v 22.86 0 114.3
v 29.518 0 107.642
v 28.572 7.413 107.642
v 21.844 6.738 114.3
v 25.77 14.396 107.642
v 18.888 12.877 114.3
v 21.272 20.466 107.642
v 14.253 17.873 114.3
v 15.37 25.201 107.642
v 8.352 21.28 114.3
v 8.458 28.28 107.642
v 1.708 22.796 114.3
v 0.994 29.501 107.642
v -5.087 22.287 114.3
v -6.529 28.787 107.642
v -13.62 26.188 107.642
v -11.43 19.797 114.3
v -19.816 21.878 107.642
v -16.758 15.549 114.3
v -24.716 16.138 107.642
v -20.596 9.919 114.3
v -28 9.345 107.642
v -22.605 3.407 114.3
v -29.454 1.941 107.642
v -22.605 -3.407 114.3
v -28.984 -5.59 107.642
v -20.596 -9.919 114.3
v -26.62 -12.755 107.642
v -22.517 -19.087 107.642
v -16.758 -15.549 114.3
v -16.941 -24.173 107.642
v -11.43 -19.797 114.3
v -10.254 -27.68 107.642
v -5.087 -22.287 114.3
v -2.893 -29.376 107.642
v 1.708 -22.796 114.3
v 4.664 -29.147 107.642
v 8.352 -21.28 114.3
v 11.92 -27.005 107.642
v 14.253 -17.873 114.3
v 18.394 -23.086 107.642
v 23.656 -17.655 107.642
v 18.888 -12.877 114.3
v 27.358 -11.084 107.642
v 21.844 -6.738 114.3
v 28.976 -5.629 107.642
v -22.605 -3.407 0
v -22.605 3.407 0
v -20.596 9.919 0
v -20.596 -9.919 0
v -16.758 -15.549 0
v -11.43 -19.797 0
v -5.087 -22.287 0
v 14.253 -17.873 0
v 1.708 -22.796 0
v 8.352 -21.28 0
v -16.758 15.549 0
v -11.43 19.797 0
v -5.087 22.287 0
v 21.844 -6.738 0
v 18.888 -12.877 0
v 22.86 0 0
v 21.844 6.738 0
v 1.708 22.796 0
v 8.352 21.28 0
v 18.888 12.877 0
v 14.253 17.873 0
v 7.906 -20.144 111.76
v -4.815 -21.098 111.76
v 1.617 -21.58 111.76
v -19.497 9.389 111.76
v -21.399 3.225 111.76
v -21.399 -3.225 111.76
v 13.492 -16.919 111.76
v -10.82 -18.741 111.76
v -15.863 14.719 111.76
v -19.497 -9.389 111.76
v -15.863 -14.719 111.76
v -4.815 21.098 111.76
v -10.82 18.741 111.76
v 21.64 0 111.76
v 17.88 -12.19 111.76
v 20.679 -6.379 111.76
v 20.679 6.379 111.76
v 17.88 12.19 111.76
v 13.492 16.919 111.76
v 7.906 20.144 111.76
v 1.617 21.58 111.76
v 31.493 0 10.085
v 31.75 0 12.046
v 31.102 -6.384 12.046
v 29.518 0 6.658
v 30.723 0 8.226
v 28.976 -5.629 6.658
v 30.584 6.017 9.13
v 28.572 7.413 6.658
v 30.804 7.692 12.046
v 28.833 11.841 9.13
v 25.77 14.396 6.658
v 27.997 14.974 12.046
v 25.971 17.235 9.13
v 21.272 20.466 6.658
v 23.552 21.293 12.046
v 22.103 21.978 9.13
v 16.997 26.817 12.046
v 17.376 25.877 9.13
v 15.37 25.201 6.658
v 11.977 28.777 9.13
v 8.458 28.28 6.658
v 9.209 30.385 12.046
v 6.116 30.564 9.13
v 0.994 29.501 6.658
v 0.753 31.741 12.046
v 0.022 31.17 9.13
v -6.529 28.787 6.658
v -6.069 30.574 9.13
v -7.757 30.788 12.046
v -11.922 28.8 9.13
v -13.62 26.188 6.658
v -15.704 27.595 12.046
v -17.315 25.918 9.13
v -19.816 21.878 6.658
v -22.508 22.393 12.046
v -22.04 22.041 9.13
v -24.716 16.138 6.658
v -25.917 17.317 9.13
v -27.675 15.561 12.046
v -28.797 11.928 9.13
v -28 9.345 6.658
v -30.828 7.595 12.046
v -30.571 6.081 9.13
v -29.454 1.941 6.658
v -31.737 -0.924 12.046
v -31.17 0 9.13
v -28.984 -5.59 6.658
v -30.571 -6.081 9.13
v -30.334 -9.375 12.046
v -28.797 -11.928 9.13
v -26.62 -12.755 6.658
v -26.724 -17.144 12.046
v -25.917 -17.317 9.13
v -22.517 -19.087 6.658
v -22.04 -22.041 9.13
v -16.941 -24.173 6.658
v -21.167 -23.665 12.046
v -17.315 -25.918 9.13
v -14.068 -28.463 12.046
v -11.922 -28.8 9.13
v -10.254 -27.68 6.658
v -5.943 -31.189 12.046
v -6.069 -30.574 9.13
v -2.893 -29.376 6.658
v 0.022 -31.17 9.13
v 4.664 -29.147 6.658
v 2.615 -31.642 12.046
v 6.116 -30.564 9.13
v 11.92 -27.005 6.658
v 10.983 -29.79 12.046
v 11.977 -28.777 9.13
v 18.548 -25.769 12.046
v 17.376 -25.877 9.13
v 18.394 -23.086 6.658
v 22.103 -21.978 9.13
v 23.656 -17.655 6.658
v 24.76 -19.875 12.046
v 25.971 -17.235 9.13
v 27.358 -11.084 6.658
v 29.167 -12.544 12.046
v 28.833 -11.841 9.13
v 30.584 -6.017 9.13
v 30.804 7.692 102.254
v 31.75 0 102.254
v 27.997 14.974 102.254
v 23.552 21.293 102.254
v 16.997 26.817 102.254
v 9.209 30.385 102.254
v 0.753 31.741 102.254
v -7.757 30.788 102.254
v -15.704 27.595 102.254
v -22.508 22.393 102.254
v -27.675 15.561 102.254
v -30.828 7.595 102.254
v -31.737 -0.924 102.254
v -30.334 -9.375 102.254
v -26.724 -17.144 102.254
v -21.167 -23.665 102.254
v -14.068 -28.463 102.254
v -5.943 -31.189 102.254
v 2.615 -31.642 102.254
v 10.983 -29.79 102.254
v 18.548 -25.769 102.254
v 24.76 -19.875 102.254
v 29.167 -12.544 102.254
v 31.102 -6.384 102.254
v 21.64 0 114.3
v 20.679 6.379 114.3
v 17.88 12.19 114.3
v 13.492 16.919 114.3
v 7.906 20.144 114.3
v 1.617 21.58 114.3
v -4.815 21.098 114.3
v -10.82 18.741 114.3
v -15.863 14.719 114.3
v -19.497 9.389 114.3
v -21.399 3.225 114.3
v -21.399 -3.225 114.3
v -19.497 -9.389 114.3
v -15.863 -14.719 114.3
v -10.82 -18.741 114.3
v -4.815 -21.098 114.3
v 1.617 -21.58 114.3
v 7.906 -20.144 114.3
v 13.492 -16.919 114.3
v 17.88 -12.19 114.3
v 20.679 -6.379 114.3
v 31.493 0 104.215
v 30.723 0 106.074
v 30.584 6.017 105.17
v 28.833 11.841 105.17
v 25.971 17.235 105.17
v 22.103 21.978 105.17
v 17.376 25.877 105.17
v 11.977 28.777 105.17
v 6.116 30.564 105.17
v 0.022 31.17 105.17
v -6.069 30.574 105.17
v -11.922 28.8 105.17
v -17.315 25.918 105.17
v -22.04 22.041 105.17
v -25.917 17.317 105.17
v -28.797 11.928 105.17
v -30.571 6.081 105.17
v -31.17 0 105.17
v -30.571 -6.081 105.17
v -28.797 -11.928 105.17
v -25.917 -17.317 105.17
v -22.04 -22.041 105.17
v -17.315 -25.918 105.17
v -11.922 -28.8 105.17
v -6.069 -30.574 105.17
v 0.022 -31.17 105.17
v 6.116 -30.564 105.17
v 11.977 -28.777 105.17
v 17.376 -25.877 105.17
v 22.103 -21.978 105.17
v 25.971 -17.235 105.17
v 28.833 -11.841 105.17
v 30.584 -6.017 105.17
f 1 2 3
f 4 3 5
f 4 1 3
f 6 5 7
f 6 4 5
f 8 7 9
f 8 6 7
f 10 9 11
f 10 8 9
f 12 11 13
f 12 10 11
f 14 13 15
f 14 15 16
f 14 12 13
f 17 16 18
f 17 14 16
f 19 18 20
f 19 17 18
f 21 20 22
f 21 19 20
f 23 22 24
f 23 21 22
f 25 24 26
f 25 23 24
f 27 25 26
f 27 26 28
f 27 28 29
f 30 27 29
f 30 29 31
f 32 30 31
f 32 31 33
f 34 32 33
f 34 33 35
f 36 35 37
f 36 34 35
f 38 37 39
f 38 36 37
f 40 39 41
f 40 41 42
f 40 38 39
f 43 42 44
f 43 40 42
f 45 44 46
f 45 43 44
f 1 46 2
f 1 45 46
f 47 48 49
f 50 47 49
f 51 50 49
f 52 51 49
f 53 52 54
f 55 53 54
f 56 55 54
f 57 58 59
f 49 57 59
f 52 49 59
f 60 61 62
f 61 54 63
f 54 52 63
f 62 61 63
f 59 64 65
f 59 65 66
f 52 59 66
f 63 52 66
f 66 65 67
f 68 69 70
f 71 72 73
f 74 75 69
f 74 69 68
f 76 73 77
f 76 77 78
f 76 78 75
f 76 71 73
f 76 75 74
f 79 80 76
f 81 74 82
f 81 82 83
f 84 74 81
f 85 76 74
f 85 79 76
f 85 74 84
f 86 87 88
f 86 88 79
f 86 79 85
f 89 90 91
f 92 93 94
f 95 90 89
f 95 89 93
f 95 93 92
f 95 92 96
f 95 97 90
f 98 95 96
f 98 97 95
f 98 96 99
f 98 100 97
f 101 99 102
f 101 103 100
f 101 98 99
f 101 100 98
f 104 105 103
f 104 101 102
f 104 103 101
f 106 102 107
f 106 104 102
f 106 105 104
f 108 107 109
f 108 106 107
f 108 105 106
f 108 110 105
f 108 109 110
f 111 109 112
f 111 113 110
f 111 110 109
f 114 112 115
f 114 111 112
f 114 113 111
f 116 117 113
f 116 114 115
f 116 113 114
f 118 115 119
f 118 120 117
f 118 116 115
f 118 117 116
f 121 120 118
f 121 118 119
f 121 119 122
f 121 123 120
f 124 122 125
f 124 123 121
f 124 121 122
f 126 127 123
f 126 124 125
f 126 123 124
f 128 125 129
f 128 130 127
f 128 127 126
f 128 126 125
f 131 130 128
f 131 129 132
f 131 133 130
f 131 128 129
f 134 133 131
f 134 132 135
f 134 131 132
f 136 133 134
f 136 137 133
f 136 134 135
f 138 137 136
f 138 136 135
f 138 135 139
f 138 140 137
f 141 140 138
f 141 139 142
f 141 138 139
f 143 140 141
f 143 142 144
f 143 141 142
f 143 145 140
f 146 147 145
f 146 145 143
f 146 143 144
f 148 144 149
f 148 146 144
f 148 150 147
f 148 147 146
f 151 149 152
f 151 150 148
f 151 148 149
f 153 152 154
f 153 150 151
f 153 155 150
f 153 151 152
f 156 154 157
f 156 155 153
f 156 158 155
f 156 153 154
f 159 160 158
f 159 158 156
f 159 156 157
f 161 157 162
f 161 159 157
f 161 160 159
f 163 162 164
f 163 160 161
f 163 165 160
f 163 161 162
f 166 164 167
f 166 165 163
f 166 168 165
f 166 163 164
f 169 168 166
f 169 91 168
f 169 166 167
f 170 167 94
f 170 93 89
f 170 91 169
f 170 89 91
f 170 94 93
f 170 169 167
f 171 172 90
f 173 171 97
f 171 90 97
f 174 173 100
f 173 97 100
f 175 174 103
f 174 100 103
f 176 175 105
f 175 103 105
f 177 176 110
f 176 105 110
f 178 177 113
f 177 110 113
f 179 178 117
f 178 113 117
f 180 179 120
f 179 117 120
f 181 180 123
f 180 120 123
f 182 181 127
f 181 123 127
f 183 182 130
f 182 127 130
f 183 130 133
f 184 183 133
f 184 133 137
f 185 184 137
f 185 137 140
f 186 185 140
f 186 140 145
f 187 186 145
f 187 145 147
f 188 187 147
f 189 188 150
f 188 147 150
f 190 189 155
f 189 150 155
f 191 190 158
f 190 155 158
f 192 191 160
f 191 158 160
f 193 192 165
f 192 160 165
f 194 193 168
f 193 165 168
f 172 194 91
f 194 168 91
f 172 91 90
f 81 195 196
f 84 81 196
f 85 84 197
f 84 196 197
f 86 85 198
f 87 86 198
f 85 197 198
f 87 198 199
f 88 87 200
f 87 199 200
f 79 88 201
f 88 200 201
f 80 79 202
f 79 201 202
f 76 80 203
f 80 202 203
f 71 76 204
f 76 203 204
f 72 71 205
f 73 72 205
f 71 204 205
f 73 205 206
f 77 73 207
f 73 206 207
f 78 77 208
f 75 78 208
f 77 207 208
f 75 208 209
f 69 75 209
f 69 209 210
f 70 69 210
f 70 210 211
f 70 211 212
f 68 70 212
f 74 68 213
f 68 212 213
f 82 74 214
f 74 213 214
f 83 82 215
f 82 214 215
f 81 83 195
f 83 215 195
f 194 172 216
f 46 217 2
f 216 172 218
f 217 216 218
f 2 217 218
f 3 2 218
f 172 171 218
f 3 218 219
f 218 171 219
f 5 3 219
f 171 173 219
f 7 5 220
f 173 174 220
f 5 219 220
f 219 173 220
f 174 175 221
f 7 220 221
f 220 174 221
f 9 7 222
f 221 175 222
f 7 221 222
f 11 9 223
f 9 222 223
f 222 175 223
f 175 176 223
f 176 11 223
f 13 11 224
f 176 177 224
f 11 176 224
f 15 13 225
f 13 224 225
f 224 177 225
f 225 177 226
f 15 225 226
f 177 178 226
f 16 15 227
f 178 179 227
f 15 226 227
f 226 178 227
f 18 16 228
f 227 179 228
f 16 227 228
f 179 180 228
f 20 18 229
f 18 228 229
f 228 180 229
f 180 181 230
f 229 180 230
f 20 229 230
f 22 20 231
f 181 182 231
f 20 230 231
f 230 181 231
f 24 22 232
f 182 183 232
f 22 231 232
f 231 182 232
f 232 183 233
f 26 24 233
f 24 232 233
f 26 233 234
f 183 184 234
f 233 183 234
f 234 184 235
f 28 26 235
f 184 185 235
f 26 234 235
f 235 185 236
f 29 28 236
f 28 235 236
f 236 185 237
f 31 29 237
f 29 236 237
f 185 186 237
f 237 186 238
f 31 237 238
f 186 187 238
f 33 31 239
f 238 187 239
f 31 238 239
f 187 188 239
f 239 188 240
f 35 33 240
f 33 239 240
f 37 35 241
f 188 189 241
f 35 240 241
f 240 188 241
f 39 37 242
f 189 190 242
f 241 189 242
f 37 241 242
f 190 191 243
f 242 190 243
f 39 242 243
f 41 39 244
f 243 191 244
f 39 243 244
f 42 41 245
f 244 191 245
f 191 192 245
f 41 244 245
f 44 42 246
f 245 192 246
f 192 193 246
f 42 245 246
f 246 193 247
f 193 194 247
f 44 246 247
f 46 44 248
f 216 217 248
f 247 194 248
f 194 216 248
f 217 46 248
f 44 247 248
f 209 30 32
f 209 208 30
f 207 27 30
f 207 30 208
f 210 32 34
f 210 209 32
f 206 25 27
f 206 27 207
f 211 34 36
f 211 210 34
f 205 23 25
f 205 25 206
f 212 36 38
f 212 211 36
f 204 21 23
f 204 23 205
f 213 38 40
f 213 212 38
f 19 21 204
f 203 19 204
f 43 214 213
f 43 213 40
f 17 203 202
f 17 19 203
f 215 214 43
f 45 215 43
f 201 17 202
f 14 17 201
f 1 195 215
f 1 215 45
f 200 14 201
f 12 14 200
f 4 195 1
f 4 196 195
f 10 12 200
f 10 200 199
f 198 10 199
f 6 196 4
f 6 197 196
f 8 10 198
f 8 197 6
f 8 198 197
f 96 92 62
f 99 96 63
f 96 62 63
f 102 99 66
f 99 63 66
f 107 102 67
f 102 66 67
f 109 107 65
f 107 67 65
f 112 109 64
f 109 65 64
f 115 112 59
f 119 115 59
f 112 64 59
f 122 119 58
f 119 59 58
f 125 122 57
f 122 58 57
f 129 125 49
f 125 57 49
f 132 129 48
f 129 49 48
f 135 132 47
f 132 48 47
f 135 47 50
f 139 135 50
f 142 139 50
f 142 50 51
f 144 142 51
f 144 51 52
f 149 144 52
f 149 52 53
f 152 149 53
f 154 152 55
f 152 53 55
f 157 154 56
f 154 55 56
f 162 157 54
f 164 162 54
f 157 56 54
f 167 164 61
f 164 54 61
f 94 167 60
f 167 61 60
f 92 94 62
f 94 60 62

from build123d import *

# Parameters (mm, degrees)
F0_R     = 31.75
F1_DEPTH = 114.3
F2_SIZE  = 8.89
F3_SIZE  = 8.89
F4_R     = 7.62
F6_R     = 21.6402594839
F7_DEPTH = 2.54


with BuildPart() as f1:
    # F0 (on Top) → F1 (new body)
    with BuildSketch(Plane.XY):
        Circle(F0_R)
    extrude(amount=F1_DEPTH)

    # F2
    f2_edges = [f1.edges().sort_by_distance(p)[0] for p in [
        (-31.75, 0, 114.3),
    ]]
    chamfer(f2_edges, length=F2_SIZE)

    # F3
    f3_edges = [f1.edges().sort_by_distance(p)[0] for p in [
        (-31.75, 0, 0),
    ]]
    chamfer(f3_edges, length=F3_SIZE)

    # F4
    f4_edges = [f1.edges().sort_by_distance(p)[0] for p in [
        (-31.75, 0, 8.89),
        (-31.75, 0, 105.41),
    ]]
    fillet(f4_edges, radius=F4_R)

    # F6 (on face) → F7 (cut)
    with BuildSketch(Plane.XY.offset(114.3)):
        Circle(F6_R)
    extrude(amount=-F7_DEPTH, mode=Mode.SUBTRACT)


solid = f1.part
